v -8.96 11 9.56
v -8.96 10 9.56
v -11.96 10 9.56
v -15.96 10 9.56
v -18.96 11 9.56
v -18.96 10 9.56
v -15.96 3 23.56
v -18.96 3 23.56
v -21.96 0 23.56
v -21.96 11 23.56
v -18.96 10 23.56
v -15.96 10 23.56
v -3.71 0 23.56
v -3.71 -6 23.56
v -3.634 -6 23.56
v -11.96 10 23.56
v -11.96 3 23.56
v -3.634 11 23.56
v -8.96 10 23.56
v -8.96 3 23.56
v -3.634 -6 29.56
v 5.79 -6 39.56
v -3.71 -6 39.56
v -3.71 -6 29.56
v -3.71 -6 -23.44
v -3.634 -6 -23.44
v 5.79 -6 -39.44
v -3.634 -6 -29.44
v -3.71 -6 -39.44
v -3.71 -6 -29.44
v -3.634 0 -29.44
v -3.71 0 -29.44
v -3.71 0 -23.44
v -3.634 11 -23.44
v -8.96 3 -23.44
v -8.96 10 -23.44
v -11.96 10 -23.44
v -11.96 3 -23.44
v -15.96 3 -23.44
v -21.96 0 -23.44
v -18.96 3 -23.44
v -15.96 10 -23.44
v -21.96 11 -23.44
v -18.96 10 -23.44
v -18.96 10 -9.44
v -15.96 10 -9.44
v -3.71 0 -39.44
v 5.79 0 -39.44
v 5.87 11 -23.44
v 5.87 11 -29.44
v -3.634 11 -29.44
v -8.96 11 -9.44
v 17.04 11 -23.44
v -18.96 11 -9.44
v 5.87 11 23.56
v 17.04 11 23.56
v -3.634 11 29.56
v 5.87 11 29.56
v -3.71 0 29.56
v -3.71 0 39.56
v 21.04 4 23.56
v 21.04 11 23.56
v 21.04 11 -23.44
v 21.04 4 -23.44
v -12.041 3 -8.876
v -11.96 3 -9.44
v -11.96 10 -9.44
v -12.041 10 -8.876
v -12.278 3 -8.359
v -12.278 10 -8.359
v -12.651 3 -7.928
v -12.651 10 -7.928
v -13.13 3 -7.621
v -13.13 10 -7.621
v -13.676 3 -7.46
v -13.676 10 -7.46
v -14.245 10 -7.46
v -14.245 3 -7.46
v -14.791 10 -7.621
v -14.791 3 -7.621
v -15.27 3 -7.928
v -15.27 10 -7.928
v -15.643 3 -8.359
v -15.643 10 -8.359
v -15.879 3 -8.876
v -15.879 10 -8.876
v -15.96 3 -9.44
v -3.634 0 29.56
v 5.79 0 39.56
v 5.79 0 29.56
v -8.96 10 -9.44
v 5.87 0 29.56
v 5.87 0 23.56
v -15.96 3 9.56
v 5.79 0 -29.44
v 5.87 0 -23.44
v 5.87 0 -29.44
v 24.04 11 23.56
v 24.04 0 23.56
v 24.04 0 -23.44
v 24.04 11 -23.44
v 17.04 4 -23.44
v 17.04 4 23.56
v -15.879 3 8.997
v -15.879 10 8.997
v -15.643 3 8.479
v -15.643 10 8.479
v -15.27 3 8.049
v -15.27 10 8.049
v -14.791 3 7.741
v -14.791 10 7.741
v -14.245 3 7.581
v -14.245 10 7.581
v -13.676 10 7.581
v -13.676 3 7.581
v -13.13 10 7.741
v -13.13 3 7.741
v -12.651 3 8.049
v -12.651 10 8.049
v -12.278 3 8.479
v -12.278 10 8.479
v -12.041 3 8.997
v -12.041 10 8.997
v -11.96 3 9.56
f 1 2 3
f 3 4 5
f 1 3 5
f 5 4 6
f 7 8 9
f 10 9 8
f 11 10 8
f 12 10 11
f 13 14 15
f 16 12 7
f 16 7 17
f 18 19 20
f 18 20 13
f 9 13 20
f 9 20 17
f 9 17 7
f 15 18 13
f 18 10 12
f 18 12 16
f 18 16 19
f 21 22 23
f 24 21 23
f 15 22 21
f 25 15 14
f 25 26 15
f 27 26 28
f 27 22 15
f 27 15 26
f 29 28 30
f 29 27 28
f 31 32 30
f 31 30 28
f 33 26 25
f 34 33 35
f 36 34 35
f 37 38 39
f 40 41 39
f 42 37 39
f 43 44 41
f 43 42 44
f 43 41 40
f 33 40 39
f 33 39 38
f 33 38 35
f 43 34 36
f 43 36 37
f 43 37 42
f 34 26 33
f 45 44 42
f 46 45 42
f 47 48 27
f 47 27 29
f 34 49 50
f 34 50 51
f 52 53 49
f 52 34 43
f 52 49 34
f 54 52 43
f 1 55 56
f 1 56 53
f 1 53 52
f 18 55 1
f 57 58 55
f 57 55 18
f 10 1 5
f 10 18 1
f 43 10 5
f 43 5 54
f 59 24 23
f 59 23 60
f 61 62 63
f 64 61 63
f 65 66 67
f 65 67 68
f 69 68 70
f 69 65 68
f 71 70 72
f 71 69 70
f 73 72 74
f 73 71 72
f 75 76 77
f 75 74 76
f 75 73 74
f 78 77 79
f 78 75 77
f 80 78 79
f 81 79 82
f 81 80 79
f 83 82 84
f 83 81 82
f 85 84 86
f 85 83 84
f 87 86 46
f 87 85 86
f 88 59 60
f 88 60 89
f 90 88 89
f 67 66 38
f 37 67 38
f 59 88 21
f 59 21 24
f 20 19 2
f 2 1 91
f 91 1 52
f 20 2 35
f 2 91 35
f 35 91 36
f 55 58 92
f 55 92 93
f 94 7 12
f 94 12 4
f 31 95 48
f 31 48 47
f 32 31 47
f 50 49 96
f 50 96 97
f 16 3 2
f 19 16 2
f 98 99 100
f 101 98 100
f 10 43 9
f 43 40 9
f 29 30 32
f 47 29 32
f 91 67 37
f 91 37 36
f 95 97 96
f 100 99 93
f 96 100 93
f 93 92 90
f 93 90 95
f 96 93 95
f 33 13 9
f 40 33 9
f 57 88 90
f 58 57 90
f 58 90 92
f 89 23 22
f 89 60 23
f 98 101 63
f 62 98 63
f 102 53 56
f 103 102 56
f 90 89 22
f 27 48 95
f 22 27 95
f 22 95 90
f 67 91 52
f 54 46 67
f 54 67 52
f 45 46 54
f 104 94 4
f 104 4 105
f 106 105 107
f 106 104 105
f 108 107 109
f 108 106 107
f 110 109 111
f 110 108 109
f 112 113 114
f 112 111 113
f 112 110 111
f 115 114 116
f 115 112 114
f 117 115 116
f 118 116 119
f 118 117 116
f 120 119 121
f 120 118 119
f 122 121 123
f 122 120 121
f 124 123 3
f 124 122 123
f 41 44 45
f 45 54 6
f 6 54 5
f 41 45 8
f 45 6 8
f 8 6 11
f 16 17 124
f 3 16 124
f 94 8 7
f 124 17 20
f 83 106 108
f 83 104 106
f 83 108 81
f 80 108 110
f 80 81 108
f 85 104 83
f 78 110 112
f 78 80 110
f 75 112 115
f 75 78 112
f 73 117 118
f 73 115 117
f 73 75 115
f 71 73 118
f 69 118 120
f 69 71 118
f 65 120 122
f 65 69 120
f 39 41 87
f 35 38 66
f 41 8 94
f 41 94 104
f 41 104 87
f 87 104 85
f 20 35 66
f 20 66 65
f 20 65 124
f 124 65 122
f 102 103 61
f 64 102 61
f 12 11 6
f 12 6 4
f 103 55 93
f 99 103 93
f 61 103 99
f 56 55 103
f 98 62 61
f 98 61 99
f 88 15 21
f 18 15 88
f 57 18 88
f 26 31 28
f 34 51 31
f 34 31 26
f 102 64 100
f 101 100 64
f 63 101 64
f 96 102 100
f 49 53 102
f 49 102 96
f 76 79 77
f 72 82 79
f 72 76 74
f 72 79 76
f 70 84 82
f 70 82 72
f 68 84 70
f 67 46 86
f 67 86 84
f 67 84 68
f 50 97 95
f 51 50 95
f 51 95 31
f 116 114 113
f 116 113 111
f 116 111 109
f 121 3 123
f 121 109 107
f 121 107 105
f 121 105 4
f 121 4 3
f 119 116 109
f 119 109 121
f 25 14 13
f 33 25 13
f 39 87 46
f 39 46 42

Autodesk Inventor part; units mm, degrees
ref_plane "YZ Plane" through (0, 0, 0) normal (1, 0, 0) x (0, 1, 0)
ref_plane "XZ Plane" through (0, 0, 0) normal (0, 1, 0) x (-1, 0, 0)
ref_plane "XY Plane" through (0, 0, 0) normal (0, 0, 1) x (1, 0, 0)
sketch "Sketch1" plane through (0, 0, 0) normal (0, 1, 0) x (-1, 0, 0)
  line L0 (21.9604, 29.5602) -> (-24.0396, 29.5602)
  line L1 (-24.0396, 29.5602) -> (-24.0396, -29.4398)
  line L2 (-24.0396, -29.4398) -> (21.9604, -29.4398)
  line L3 (21.9604, -29.4398) -> (21.9604, 29.5602)
  dimension "d0" = 46
  dimension "d1" = 59
extrude "Extrusion1" add sketch "Sketch1" along normal blind 11
sketch "Sketch2" plane through (0, 11, 0) normal (0, 1, 0) x (1, 0, 0)
  line L0 (-18.9604, -32.4344) -> (-8.9604, -32.4344)
  line L1 (-8.9604, -32.4344) -> (-8.9604, 37.5656)
  line L2 (-8.9604, 37.5656) -> (-18.9604, 37.5656)
  line L3 (-18.9604, 37.5656) -> (-18.9604, -32.4344)
  line L4 (-21.9604, 29.4398) -> (-21.9604, -29.5602) projected
  point P0 (0, 0)
  dimension "d4" = 10
  dimension "d5" = 70
  dimension "d6" = 3
extrude "Extrusion2" cut sketch "Sketch2" against normal blind 8
sketch "Sketch3" plane through (0, 11, 0) normal (0, 1, 0) x (1, 0, 0)
  line L0 (17.0396, -31.142) -> (21.0396, -31.142)
  line L1 (21.0396, -31.142) -> (21.0396, 38.858)
  line L2 (21.0396, 38.858) -> (17.0396, 38.858)
  line L3 (17.0396, 38.858) -> (17.0396, -31.142)
  line L4 (24.0396, -29.5602) -> (24.0396, 29.4398) projected
  point P0 (0, 0)
  dimension "d9" = 4
  dimension "d10" = 70
  dimension "d11" = 3
extrude "Extrusion3" cut sketch "Sketch3" against normal blind 7
sketch "Sketch4" plane through (0, 3, 0) normal (0, 1, 0) x (1, 0, 0)
  line L0 (-15.9604, -24.5602) -> (-15.9604, -9.5602)
  line L1 (-11.9604, -24.5602) -> (-11.9604, -9.5602)
  arc A0 (-11.9604, -9.5602) -> (-15.9604, -9.5602) centre (-13.9604, -9.5602) ccw
  arc A1 (-15.9604, -24.5602) -> (-11.9604, -24.5602) centre (-13.9604, -24.5602) ccw
  line L2 (-18.9604, -29.5602) -> (-18.9604, 29.4398) projected
  line L3 (-8.9604, 29.4398) -> (-8.9604, -29.5602) projected
  line L4 (-8.9604, -29.5602) -> (-18.9604, -29.5602) projected
  line L5 (-15.9604, 9.4398) -> (-15.9604, 24.4398)
  line L6 (-11.9604, 9.4398) -> (-11.9604, 24.4398)
  arc A2 (-11.9604, 24.4398) -> (-15.9604, 24.4398) centre (-13.9604, 24.4398) ccw
  arc A3 (-15.9604, 9.4398) -> (-11.9604, 9.4398) centre (-13.9604, 9.4398) ccw
  line L7 (-18.9604, 29.4398) -> (-8.9604, 29.4398) projected
  point P0 (0, 0)
  point P1 (-13.9604, 29.4398)
  point P2 (-11.9604, 16.9398)
  point P3 (-15.9604, 16.9398)
  dimension "d14" = 4
  dimension "d21" = 3
  dimension "d22" = 3
  dimension "d31" = 5
  dimension "d32" = 15
  dimension "d43" = 15
  dimension "d44" = 5
  dimension "d45" = 4
  dimension "d46" = 3
  dimension "d47" = 3
extrude "Extrusion4" add sketch "Sketch4" along normal blind 7 contours L0 A0 L1 A1 | L5 A2 L6 A3
sketch "Sketch6" plane through (0, 10, 0) normal (0, 1, 0) x (1, 0, 0)
  line L0 (-19.9604, -23.5602) -> (-7.9604, -23.5602)
  line L1 (-7.9604, -23.5602) -> (-7.9604, -9.5602)
  line L2 (-7.9604, -9.5602) -> (-19.9604, -9.5602)
  line L3 (-19.9604, -9.5602) -> (-19.9604, -23.5602)
  arc A0 (-11.9604, -9.5602) -> (-15.9604, -9.5602) centre (-13.9604, -9.5602) ccw projected
  line L4 (-15.9604, -9.5602) -> (-15.9604, -24.5602) projected
  line L5 (-18.9604, -29.5602) -> (-18.9604, 29.4398) projected
  line L6 (-8.9604, 29.4398) -> (-8.9604, -29.5602) projected
  line L7 (-19.9604, 9.4398) -> (-19.9604, 23.4398)
  line L8 (-19.9604, 23.4398) -> (-7.9604, 23.4398)
  line L9 (-7.9604, 23.4398) -> (-7.9604, 9.4398)
  line L10 (-7.9604, 9.4398) -> (-19.9604, 9.4398)
  point P0 (0, 0)
  point P1 (-13.9604, -7.5602)
  point P2 (-19.9604, -16.5602)
  point P3 (-7.9604, 16.4398)
  point P4 (-19.9604, 16.4398)
  point P5 (-18.9604, 9.4398)
  point P6 (-8.9604, 9.4398)
  point P7 (-8.9604, 23.4398)
  point P8 (-18.9604, 23.4398)
  dimension "d33" = 14
  dimension "d35" = 0
  dimension "d37" = 1
  dimension "d41" = 12
  dimension "d48" = 14
  dimension "d49" = 12
  dimension "d62" = 19
extrude "Extrusion6" add sketch "Sketch6" along normal blind 1 contours L3 L2 L5 L0 | L5 L2 L4 L0 | L4 L2 L6 L0 | L6 L2 L1 L0 | L5 L8 L6 L10
sketch "Sketch8" plane through (0, 0, 0) normal (0, -1, 0) x (1, 0, 0)
  line L0 (5.7896, 31.0602) -> (-3.7104, 31.0602)
  line L1 (-3.7104, 31.0602) -> (-3.7104, -30.9398)
  line L2 (-3.7104, -30.9398) -> (5.7896, -30.9398)
  line L3 (5.7896, -30.9398) -> (5.7896, 31.0602)
  line L4 (-21.9604, 29.5602) -> (24.0396, 29.5602) projected
  line L5 (24.0396, -29.4398) -> (-21.9604, -29.4398) projected
  line L6 (24.0396, 29.5602) -> (24.0396, -29.4398) projected
  line L7 (-21.9604, -29.4398) -> (-21.9604, 29.5602) projected
  point P0 (0, 0)
  point P1 (-3.7104, -29.4398)
  point P2 (5.7896, -29.4398)
  point P3 (5.7896, 29.5602)
  point P4 (-3.7104, 29.5602)
  dimension "d50" = 9.5
  dimension "d51" = 62
  dimension "d52" = 1.5
  dimension "d53" = 1.5
  dimension "d54" = 18.25
  dimension "d55" = 18.25
extrude "Extrusion7" add sketch "Sketch8" along normal blind 6 contours L3 L5 L1 L4
sketch "Sketch9" plane through (24.0396, 0, -29.4398) normal (0, 0, -1) x (-1, 0, 0)
  point P0 (24.0396, 0)
sketch "Sketch10" plane through (24.0396, 0, -29.4398) normal (0, 0, -1) x (-1, 0, 0)
  line L0 (0, 0) -> (18.25, 0) projected
  line L1 (27.75, 0) -> (27.75, -6) projected
  line L2 (18.25, 0) -> (27.75, 0)
  line L3 (27.75, 0) -> (27.75, -6)
  line L4 (27.75, -6) -> (18.25, -6)
  line L5 (18.25, -6) -> (18.25, 0)
  point P0 (24.0396, 0)
extrude "Extrusion8" add sketch "Sketch10" along normal blind 10
sketch "Sketch11" plane through (-21.9604, 0, 29.5602) normal (0, 0, 1) x (1, 0, 0)
  line L0 (0, 0) -> (18.25, 0) projected
  line L1 (18.25, 0) -> (27.75, 0)
  line L2 (27.75, 0) -> (27.75, -6)
  line L3 (27.75, -6) -> (18.25, -6)
  line L4 (18.25, -6) -> (18.25, 0)
  point P0 (21.9604, 0)
extrude "Extrusion9" add sketch "Sketch11" along normal blind 10
sketch "Sketch12" plane through (0, 11, 0) normal (0, 1, 0) x (1, 0, 0)
  line L0 (24.0396, -29.5602) -> (24.0396, 29.4398) projected
  line L1 (-21.9604, 29.4398) -> (-21.9604, -29.5602) projected
  line L2 (24.0396, -29.5602) -> (-21.9604, -29.5602)
  line L3 (-21.9604, -29.5602) -> (-21.9604, -23.5602)
  line L4 (24.0396, -23.5602) -> (24.0396, -29.5602)
  line L5 (-21.9604, 29.4398) -> (24.0396, 29.4398)
  line L6 (24.0396, 29.4398) -> (24.0396, 23.4398)
  line L7 (-21.9604, 23.4398) -> (-21.9604, 29.4398)
  line L8 (-21.9604, -23.5602) -> (-3.6341, -23.5602)
  line L9 (5.8705, -23.5602) -> (24.0396, -23.5602)
  line L10 (24.0396, 23.4398) -> (5.8705, 23.4398)
  line L11 (-3.6341, 23.4398) -> (-21.9604, 23.4398)
  line L12 (-3.6341, 29.4398) -> (-3.6341, 23.4398)
  line L13 (-3.6341, -23.5602) -> (-3.6341, -29.5602)
  line L14 (5.8705, -29.5602) -> (5.8705, -23.5602)
  line L15 (5.8705, 23.4398) -> (5.8705, 29.4398)
  point P0 (0, 0)
  point P1 (-21.9604, -29.5602)
  dimension "d63" = 6
  dimension "d64" = 6
extrude "Extrusion10" cut sketch "Sketch12" against normal blind 100 contours L2 L14 L9 L0 | L10 L15 L5 L0 | L2 L1 L8 L13 | L12 L11 L1 L5
properties part number "table_bridge"
